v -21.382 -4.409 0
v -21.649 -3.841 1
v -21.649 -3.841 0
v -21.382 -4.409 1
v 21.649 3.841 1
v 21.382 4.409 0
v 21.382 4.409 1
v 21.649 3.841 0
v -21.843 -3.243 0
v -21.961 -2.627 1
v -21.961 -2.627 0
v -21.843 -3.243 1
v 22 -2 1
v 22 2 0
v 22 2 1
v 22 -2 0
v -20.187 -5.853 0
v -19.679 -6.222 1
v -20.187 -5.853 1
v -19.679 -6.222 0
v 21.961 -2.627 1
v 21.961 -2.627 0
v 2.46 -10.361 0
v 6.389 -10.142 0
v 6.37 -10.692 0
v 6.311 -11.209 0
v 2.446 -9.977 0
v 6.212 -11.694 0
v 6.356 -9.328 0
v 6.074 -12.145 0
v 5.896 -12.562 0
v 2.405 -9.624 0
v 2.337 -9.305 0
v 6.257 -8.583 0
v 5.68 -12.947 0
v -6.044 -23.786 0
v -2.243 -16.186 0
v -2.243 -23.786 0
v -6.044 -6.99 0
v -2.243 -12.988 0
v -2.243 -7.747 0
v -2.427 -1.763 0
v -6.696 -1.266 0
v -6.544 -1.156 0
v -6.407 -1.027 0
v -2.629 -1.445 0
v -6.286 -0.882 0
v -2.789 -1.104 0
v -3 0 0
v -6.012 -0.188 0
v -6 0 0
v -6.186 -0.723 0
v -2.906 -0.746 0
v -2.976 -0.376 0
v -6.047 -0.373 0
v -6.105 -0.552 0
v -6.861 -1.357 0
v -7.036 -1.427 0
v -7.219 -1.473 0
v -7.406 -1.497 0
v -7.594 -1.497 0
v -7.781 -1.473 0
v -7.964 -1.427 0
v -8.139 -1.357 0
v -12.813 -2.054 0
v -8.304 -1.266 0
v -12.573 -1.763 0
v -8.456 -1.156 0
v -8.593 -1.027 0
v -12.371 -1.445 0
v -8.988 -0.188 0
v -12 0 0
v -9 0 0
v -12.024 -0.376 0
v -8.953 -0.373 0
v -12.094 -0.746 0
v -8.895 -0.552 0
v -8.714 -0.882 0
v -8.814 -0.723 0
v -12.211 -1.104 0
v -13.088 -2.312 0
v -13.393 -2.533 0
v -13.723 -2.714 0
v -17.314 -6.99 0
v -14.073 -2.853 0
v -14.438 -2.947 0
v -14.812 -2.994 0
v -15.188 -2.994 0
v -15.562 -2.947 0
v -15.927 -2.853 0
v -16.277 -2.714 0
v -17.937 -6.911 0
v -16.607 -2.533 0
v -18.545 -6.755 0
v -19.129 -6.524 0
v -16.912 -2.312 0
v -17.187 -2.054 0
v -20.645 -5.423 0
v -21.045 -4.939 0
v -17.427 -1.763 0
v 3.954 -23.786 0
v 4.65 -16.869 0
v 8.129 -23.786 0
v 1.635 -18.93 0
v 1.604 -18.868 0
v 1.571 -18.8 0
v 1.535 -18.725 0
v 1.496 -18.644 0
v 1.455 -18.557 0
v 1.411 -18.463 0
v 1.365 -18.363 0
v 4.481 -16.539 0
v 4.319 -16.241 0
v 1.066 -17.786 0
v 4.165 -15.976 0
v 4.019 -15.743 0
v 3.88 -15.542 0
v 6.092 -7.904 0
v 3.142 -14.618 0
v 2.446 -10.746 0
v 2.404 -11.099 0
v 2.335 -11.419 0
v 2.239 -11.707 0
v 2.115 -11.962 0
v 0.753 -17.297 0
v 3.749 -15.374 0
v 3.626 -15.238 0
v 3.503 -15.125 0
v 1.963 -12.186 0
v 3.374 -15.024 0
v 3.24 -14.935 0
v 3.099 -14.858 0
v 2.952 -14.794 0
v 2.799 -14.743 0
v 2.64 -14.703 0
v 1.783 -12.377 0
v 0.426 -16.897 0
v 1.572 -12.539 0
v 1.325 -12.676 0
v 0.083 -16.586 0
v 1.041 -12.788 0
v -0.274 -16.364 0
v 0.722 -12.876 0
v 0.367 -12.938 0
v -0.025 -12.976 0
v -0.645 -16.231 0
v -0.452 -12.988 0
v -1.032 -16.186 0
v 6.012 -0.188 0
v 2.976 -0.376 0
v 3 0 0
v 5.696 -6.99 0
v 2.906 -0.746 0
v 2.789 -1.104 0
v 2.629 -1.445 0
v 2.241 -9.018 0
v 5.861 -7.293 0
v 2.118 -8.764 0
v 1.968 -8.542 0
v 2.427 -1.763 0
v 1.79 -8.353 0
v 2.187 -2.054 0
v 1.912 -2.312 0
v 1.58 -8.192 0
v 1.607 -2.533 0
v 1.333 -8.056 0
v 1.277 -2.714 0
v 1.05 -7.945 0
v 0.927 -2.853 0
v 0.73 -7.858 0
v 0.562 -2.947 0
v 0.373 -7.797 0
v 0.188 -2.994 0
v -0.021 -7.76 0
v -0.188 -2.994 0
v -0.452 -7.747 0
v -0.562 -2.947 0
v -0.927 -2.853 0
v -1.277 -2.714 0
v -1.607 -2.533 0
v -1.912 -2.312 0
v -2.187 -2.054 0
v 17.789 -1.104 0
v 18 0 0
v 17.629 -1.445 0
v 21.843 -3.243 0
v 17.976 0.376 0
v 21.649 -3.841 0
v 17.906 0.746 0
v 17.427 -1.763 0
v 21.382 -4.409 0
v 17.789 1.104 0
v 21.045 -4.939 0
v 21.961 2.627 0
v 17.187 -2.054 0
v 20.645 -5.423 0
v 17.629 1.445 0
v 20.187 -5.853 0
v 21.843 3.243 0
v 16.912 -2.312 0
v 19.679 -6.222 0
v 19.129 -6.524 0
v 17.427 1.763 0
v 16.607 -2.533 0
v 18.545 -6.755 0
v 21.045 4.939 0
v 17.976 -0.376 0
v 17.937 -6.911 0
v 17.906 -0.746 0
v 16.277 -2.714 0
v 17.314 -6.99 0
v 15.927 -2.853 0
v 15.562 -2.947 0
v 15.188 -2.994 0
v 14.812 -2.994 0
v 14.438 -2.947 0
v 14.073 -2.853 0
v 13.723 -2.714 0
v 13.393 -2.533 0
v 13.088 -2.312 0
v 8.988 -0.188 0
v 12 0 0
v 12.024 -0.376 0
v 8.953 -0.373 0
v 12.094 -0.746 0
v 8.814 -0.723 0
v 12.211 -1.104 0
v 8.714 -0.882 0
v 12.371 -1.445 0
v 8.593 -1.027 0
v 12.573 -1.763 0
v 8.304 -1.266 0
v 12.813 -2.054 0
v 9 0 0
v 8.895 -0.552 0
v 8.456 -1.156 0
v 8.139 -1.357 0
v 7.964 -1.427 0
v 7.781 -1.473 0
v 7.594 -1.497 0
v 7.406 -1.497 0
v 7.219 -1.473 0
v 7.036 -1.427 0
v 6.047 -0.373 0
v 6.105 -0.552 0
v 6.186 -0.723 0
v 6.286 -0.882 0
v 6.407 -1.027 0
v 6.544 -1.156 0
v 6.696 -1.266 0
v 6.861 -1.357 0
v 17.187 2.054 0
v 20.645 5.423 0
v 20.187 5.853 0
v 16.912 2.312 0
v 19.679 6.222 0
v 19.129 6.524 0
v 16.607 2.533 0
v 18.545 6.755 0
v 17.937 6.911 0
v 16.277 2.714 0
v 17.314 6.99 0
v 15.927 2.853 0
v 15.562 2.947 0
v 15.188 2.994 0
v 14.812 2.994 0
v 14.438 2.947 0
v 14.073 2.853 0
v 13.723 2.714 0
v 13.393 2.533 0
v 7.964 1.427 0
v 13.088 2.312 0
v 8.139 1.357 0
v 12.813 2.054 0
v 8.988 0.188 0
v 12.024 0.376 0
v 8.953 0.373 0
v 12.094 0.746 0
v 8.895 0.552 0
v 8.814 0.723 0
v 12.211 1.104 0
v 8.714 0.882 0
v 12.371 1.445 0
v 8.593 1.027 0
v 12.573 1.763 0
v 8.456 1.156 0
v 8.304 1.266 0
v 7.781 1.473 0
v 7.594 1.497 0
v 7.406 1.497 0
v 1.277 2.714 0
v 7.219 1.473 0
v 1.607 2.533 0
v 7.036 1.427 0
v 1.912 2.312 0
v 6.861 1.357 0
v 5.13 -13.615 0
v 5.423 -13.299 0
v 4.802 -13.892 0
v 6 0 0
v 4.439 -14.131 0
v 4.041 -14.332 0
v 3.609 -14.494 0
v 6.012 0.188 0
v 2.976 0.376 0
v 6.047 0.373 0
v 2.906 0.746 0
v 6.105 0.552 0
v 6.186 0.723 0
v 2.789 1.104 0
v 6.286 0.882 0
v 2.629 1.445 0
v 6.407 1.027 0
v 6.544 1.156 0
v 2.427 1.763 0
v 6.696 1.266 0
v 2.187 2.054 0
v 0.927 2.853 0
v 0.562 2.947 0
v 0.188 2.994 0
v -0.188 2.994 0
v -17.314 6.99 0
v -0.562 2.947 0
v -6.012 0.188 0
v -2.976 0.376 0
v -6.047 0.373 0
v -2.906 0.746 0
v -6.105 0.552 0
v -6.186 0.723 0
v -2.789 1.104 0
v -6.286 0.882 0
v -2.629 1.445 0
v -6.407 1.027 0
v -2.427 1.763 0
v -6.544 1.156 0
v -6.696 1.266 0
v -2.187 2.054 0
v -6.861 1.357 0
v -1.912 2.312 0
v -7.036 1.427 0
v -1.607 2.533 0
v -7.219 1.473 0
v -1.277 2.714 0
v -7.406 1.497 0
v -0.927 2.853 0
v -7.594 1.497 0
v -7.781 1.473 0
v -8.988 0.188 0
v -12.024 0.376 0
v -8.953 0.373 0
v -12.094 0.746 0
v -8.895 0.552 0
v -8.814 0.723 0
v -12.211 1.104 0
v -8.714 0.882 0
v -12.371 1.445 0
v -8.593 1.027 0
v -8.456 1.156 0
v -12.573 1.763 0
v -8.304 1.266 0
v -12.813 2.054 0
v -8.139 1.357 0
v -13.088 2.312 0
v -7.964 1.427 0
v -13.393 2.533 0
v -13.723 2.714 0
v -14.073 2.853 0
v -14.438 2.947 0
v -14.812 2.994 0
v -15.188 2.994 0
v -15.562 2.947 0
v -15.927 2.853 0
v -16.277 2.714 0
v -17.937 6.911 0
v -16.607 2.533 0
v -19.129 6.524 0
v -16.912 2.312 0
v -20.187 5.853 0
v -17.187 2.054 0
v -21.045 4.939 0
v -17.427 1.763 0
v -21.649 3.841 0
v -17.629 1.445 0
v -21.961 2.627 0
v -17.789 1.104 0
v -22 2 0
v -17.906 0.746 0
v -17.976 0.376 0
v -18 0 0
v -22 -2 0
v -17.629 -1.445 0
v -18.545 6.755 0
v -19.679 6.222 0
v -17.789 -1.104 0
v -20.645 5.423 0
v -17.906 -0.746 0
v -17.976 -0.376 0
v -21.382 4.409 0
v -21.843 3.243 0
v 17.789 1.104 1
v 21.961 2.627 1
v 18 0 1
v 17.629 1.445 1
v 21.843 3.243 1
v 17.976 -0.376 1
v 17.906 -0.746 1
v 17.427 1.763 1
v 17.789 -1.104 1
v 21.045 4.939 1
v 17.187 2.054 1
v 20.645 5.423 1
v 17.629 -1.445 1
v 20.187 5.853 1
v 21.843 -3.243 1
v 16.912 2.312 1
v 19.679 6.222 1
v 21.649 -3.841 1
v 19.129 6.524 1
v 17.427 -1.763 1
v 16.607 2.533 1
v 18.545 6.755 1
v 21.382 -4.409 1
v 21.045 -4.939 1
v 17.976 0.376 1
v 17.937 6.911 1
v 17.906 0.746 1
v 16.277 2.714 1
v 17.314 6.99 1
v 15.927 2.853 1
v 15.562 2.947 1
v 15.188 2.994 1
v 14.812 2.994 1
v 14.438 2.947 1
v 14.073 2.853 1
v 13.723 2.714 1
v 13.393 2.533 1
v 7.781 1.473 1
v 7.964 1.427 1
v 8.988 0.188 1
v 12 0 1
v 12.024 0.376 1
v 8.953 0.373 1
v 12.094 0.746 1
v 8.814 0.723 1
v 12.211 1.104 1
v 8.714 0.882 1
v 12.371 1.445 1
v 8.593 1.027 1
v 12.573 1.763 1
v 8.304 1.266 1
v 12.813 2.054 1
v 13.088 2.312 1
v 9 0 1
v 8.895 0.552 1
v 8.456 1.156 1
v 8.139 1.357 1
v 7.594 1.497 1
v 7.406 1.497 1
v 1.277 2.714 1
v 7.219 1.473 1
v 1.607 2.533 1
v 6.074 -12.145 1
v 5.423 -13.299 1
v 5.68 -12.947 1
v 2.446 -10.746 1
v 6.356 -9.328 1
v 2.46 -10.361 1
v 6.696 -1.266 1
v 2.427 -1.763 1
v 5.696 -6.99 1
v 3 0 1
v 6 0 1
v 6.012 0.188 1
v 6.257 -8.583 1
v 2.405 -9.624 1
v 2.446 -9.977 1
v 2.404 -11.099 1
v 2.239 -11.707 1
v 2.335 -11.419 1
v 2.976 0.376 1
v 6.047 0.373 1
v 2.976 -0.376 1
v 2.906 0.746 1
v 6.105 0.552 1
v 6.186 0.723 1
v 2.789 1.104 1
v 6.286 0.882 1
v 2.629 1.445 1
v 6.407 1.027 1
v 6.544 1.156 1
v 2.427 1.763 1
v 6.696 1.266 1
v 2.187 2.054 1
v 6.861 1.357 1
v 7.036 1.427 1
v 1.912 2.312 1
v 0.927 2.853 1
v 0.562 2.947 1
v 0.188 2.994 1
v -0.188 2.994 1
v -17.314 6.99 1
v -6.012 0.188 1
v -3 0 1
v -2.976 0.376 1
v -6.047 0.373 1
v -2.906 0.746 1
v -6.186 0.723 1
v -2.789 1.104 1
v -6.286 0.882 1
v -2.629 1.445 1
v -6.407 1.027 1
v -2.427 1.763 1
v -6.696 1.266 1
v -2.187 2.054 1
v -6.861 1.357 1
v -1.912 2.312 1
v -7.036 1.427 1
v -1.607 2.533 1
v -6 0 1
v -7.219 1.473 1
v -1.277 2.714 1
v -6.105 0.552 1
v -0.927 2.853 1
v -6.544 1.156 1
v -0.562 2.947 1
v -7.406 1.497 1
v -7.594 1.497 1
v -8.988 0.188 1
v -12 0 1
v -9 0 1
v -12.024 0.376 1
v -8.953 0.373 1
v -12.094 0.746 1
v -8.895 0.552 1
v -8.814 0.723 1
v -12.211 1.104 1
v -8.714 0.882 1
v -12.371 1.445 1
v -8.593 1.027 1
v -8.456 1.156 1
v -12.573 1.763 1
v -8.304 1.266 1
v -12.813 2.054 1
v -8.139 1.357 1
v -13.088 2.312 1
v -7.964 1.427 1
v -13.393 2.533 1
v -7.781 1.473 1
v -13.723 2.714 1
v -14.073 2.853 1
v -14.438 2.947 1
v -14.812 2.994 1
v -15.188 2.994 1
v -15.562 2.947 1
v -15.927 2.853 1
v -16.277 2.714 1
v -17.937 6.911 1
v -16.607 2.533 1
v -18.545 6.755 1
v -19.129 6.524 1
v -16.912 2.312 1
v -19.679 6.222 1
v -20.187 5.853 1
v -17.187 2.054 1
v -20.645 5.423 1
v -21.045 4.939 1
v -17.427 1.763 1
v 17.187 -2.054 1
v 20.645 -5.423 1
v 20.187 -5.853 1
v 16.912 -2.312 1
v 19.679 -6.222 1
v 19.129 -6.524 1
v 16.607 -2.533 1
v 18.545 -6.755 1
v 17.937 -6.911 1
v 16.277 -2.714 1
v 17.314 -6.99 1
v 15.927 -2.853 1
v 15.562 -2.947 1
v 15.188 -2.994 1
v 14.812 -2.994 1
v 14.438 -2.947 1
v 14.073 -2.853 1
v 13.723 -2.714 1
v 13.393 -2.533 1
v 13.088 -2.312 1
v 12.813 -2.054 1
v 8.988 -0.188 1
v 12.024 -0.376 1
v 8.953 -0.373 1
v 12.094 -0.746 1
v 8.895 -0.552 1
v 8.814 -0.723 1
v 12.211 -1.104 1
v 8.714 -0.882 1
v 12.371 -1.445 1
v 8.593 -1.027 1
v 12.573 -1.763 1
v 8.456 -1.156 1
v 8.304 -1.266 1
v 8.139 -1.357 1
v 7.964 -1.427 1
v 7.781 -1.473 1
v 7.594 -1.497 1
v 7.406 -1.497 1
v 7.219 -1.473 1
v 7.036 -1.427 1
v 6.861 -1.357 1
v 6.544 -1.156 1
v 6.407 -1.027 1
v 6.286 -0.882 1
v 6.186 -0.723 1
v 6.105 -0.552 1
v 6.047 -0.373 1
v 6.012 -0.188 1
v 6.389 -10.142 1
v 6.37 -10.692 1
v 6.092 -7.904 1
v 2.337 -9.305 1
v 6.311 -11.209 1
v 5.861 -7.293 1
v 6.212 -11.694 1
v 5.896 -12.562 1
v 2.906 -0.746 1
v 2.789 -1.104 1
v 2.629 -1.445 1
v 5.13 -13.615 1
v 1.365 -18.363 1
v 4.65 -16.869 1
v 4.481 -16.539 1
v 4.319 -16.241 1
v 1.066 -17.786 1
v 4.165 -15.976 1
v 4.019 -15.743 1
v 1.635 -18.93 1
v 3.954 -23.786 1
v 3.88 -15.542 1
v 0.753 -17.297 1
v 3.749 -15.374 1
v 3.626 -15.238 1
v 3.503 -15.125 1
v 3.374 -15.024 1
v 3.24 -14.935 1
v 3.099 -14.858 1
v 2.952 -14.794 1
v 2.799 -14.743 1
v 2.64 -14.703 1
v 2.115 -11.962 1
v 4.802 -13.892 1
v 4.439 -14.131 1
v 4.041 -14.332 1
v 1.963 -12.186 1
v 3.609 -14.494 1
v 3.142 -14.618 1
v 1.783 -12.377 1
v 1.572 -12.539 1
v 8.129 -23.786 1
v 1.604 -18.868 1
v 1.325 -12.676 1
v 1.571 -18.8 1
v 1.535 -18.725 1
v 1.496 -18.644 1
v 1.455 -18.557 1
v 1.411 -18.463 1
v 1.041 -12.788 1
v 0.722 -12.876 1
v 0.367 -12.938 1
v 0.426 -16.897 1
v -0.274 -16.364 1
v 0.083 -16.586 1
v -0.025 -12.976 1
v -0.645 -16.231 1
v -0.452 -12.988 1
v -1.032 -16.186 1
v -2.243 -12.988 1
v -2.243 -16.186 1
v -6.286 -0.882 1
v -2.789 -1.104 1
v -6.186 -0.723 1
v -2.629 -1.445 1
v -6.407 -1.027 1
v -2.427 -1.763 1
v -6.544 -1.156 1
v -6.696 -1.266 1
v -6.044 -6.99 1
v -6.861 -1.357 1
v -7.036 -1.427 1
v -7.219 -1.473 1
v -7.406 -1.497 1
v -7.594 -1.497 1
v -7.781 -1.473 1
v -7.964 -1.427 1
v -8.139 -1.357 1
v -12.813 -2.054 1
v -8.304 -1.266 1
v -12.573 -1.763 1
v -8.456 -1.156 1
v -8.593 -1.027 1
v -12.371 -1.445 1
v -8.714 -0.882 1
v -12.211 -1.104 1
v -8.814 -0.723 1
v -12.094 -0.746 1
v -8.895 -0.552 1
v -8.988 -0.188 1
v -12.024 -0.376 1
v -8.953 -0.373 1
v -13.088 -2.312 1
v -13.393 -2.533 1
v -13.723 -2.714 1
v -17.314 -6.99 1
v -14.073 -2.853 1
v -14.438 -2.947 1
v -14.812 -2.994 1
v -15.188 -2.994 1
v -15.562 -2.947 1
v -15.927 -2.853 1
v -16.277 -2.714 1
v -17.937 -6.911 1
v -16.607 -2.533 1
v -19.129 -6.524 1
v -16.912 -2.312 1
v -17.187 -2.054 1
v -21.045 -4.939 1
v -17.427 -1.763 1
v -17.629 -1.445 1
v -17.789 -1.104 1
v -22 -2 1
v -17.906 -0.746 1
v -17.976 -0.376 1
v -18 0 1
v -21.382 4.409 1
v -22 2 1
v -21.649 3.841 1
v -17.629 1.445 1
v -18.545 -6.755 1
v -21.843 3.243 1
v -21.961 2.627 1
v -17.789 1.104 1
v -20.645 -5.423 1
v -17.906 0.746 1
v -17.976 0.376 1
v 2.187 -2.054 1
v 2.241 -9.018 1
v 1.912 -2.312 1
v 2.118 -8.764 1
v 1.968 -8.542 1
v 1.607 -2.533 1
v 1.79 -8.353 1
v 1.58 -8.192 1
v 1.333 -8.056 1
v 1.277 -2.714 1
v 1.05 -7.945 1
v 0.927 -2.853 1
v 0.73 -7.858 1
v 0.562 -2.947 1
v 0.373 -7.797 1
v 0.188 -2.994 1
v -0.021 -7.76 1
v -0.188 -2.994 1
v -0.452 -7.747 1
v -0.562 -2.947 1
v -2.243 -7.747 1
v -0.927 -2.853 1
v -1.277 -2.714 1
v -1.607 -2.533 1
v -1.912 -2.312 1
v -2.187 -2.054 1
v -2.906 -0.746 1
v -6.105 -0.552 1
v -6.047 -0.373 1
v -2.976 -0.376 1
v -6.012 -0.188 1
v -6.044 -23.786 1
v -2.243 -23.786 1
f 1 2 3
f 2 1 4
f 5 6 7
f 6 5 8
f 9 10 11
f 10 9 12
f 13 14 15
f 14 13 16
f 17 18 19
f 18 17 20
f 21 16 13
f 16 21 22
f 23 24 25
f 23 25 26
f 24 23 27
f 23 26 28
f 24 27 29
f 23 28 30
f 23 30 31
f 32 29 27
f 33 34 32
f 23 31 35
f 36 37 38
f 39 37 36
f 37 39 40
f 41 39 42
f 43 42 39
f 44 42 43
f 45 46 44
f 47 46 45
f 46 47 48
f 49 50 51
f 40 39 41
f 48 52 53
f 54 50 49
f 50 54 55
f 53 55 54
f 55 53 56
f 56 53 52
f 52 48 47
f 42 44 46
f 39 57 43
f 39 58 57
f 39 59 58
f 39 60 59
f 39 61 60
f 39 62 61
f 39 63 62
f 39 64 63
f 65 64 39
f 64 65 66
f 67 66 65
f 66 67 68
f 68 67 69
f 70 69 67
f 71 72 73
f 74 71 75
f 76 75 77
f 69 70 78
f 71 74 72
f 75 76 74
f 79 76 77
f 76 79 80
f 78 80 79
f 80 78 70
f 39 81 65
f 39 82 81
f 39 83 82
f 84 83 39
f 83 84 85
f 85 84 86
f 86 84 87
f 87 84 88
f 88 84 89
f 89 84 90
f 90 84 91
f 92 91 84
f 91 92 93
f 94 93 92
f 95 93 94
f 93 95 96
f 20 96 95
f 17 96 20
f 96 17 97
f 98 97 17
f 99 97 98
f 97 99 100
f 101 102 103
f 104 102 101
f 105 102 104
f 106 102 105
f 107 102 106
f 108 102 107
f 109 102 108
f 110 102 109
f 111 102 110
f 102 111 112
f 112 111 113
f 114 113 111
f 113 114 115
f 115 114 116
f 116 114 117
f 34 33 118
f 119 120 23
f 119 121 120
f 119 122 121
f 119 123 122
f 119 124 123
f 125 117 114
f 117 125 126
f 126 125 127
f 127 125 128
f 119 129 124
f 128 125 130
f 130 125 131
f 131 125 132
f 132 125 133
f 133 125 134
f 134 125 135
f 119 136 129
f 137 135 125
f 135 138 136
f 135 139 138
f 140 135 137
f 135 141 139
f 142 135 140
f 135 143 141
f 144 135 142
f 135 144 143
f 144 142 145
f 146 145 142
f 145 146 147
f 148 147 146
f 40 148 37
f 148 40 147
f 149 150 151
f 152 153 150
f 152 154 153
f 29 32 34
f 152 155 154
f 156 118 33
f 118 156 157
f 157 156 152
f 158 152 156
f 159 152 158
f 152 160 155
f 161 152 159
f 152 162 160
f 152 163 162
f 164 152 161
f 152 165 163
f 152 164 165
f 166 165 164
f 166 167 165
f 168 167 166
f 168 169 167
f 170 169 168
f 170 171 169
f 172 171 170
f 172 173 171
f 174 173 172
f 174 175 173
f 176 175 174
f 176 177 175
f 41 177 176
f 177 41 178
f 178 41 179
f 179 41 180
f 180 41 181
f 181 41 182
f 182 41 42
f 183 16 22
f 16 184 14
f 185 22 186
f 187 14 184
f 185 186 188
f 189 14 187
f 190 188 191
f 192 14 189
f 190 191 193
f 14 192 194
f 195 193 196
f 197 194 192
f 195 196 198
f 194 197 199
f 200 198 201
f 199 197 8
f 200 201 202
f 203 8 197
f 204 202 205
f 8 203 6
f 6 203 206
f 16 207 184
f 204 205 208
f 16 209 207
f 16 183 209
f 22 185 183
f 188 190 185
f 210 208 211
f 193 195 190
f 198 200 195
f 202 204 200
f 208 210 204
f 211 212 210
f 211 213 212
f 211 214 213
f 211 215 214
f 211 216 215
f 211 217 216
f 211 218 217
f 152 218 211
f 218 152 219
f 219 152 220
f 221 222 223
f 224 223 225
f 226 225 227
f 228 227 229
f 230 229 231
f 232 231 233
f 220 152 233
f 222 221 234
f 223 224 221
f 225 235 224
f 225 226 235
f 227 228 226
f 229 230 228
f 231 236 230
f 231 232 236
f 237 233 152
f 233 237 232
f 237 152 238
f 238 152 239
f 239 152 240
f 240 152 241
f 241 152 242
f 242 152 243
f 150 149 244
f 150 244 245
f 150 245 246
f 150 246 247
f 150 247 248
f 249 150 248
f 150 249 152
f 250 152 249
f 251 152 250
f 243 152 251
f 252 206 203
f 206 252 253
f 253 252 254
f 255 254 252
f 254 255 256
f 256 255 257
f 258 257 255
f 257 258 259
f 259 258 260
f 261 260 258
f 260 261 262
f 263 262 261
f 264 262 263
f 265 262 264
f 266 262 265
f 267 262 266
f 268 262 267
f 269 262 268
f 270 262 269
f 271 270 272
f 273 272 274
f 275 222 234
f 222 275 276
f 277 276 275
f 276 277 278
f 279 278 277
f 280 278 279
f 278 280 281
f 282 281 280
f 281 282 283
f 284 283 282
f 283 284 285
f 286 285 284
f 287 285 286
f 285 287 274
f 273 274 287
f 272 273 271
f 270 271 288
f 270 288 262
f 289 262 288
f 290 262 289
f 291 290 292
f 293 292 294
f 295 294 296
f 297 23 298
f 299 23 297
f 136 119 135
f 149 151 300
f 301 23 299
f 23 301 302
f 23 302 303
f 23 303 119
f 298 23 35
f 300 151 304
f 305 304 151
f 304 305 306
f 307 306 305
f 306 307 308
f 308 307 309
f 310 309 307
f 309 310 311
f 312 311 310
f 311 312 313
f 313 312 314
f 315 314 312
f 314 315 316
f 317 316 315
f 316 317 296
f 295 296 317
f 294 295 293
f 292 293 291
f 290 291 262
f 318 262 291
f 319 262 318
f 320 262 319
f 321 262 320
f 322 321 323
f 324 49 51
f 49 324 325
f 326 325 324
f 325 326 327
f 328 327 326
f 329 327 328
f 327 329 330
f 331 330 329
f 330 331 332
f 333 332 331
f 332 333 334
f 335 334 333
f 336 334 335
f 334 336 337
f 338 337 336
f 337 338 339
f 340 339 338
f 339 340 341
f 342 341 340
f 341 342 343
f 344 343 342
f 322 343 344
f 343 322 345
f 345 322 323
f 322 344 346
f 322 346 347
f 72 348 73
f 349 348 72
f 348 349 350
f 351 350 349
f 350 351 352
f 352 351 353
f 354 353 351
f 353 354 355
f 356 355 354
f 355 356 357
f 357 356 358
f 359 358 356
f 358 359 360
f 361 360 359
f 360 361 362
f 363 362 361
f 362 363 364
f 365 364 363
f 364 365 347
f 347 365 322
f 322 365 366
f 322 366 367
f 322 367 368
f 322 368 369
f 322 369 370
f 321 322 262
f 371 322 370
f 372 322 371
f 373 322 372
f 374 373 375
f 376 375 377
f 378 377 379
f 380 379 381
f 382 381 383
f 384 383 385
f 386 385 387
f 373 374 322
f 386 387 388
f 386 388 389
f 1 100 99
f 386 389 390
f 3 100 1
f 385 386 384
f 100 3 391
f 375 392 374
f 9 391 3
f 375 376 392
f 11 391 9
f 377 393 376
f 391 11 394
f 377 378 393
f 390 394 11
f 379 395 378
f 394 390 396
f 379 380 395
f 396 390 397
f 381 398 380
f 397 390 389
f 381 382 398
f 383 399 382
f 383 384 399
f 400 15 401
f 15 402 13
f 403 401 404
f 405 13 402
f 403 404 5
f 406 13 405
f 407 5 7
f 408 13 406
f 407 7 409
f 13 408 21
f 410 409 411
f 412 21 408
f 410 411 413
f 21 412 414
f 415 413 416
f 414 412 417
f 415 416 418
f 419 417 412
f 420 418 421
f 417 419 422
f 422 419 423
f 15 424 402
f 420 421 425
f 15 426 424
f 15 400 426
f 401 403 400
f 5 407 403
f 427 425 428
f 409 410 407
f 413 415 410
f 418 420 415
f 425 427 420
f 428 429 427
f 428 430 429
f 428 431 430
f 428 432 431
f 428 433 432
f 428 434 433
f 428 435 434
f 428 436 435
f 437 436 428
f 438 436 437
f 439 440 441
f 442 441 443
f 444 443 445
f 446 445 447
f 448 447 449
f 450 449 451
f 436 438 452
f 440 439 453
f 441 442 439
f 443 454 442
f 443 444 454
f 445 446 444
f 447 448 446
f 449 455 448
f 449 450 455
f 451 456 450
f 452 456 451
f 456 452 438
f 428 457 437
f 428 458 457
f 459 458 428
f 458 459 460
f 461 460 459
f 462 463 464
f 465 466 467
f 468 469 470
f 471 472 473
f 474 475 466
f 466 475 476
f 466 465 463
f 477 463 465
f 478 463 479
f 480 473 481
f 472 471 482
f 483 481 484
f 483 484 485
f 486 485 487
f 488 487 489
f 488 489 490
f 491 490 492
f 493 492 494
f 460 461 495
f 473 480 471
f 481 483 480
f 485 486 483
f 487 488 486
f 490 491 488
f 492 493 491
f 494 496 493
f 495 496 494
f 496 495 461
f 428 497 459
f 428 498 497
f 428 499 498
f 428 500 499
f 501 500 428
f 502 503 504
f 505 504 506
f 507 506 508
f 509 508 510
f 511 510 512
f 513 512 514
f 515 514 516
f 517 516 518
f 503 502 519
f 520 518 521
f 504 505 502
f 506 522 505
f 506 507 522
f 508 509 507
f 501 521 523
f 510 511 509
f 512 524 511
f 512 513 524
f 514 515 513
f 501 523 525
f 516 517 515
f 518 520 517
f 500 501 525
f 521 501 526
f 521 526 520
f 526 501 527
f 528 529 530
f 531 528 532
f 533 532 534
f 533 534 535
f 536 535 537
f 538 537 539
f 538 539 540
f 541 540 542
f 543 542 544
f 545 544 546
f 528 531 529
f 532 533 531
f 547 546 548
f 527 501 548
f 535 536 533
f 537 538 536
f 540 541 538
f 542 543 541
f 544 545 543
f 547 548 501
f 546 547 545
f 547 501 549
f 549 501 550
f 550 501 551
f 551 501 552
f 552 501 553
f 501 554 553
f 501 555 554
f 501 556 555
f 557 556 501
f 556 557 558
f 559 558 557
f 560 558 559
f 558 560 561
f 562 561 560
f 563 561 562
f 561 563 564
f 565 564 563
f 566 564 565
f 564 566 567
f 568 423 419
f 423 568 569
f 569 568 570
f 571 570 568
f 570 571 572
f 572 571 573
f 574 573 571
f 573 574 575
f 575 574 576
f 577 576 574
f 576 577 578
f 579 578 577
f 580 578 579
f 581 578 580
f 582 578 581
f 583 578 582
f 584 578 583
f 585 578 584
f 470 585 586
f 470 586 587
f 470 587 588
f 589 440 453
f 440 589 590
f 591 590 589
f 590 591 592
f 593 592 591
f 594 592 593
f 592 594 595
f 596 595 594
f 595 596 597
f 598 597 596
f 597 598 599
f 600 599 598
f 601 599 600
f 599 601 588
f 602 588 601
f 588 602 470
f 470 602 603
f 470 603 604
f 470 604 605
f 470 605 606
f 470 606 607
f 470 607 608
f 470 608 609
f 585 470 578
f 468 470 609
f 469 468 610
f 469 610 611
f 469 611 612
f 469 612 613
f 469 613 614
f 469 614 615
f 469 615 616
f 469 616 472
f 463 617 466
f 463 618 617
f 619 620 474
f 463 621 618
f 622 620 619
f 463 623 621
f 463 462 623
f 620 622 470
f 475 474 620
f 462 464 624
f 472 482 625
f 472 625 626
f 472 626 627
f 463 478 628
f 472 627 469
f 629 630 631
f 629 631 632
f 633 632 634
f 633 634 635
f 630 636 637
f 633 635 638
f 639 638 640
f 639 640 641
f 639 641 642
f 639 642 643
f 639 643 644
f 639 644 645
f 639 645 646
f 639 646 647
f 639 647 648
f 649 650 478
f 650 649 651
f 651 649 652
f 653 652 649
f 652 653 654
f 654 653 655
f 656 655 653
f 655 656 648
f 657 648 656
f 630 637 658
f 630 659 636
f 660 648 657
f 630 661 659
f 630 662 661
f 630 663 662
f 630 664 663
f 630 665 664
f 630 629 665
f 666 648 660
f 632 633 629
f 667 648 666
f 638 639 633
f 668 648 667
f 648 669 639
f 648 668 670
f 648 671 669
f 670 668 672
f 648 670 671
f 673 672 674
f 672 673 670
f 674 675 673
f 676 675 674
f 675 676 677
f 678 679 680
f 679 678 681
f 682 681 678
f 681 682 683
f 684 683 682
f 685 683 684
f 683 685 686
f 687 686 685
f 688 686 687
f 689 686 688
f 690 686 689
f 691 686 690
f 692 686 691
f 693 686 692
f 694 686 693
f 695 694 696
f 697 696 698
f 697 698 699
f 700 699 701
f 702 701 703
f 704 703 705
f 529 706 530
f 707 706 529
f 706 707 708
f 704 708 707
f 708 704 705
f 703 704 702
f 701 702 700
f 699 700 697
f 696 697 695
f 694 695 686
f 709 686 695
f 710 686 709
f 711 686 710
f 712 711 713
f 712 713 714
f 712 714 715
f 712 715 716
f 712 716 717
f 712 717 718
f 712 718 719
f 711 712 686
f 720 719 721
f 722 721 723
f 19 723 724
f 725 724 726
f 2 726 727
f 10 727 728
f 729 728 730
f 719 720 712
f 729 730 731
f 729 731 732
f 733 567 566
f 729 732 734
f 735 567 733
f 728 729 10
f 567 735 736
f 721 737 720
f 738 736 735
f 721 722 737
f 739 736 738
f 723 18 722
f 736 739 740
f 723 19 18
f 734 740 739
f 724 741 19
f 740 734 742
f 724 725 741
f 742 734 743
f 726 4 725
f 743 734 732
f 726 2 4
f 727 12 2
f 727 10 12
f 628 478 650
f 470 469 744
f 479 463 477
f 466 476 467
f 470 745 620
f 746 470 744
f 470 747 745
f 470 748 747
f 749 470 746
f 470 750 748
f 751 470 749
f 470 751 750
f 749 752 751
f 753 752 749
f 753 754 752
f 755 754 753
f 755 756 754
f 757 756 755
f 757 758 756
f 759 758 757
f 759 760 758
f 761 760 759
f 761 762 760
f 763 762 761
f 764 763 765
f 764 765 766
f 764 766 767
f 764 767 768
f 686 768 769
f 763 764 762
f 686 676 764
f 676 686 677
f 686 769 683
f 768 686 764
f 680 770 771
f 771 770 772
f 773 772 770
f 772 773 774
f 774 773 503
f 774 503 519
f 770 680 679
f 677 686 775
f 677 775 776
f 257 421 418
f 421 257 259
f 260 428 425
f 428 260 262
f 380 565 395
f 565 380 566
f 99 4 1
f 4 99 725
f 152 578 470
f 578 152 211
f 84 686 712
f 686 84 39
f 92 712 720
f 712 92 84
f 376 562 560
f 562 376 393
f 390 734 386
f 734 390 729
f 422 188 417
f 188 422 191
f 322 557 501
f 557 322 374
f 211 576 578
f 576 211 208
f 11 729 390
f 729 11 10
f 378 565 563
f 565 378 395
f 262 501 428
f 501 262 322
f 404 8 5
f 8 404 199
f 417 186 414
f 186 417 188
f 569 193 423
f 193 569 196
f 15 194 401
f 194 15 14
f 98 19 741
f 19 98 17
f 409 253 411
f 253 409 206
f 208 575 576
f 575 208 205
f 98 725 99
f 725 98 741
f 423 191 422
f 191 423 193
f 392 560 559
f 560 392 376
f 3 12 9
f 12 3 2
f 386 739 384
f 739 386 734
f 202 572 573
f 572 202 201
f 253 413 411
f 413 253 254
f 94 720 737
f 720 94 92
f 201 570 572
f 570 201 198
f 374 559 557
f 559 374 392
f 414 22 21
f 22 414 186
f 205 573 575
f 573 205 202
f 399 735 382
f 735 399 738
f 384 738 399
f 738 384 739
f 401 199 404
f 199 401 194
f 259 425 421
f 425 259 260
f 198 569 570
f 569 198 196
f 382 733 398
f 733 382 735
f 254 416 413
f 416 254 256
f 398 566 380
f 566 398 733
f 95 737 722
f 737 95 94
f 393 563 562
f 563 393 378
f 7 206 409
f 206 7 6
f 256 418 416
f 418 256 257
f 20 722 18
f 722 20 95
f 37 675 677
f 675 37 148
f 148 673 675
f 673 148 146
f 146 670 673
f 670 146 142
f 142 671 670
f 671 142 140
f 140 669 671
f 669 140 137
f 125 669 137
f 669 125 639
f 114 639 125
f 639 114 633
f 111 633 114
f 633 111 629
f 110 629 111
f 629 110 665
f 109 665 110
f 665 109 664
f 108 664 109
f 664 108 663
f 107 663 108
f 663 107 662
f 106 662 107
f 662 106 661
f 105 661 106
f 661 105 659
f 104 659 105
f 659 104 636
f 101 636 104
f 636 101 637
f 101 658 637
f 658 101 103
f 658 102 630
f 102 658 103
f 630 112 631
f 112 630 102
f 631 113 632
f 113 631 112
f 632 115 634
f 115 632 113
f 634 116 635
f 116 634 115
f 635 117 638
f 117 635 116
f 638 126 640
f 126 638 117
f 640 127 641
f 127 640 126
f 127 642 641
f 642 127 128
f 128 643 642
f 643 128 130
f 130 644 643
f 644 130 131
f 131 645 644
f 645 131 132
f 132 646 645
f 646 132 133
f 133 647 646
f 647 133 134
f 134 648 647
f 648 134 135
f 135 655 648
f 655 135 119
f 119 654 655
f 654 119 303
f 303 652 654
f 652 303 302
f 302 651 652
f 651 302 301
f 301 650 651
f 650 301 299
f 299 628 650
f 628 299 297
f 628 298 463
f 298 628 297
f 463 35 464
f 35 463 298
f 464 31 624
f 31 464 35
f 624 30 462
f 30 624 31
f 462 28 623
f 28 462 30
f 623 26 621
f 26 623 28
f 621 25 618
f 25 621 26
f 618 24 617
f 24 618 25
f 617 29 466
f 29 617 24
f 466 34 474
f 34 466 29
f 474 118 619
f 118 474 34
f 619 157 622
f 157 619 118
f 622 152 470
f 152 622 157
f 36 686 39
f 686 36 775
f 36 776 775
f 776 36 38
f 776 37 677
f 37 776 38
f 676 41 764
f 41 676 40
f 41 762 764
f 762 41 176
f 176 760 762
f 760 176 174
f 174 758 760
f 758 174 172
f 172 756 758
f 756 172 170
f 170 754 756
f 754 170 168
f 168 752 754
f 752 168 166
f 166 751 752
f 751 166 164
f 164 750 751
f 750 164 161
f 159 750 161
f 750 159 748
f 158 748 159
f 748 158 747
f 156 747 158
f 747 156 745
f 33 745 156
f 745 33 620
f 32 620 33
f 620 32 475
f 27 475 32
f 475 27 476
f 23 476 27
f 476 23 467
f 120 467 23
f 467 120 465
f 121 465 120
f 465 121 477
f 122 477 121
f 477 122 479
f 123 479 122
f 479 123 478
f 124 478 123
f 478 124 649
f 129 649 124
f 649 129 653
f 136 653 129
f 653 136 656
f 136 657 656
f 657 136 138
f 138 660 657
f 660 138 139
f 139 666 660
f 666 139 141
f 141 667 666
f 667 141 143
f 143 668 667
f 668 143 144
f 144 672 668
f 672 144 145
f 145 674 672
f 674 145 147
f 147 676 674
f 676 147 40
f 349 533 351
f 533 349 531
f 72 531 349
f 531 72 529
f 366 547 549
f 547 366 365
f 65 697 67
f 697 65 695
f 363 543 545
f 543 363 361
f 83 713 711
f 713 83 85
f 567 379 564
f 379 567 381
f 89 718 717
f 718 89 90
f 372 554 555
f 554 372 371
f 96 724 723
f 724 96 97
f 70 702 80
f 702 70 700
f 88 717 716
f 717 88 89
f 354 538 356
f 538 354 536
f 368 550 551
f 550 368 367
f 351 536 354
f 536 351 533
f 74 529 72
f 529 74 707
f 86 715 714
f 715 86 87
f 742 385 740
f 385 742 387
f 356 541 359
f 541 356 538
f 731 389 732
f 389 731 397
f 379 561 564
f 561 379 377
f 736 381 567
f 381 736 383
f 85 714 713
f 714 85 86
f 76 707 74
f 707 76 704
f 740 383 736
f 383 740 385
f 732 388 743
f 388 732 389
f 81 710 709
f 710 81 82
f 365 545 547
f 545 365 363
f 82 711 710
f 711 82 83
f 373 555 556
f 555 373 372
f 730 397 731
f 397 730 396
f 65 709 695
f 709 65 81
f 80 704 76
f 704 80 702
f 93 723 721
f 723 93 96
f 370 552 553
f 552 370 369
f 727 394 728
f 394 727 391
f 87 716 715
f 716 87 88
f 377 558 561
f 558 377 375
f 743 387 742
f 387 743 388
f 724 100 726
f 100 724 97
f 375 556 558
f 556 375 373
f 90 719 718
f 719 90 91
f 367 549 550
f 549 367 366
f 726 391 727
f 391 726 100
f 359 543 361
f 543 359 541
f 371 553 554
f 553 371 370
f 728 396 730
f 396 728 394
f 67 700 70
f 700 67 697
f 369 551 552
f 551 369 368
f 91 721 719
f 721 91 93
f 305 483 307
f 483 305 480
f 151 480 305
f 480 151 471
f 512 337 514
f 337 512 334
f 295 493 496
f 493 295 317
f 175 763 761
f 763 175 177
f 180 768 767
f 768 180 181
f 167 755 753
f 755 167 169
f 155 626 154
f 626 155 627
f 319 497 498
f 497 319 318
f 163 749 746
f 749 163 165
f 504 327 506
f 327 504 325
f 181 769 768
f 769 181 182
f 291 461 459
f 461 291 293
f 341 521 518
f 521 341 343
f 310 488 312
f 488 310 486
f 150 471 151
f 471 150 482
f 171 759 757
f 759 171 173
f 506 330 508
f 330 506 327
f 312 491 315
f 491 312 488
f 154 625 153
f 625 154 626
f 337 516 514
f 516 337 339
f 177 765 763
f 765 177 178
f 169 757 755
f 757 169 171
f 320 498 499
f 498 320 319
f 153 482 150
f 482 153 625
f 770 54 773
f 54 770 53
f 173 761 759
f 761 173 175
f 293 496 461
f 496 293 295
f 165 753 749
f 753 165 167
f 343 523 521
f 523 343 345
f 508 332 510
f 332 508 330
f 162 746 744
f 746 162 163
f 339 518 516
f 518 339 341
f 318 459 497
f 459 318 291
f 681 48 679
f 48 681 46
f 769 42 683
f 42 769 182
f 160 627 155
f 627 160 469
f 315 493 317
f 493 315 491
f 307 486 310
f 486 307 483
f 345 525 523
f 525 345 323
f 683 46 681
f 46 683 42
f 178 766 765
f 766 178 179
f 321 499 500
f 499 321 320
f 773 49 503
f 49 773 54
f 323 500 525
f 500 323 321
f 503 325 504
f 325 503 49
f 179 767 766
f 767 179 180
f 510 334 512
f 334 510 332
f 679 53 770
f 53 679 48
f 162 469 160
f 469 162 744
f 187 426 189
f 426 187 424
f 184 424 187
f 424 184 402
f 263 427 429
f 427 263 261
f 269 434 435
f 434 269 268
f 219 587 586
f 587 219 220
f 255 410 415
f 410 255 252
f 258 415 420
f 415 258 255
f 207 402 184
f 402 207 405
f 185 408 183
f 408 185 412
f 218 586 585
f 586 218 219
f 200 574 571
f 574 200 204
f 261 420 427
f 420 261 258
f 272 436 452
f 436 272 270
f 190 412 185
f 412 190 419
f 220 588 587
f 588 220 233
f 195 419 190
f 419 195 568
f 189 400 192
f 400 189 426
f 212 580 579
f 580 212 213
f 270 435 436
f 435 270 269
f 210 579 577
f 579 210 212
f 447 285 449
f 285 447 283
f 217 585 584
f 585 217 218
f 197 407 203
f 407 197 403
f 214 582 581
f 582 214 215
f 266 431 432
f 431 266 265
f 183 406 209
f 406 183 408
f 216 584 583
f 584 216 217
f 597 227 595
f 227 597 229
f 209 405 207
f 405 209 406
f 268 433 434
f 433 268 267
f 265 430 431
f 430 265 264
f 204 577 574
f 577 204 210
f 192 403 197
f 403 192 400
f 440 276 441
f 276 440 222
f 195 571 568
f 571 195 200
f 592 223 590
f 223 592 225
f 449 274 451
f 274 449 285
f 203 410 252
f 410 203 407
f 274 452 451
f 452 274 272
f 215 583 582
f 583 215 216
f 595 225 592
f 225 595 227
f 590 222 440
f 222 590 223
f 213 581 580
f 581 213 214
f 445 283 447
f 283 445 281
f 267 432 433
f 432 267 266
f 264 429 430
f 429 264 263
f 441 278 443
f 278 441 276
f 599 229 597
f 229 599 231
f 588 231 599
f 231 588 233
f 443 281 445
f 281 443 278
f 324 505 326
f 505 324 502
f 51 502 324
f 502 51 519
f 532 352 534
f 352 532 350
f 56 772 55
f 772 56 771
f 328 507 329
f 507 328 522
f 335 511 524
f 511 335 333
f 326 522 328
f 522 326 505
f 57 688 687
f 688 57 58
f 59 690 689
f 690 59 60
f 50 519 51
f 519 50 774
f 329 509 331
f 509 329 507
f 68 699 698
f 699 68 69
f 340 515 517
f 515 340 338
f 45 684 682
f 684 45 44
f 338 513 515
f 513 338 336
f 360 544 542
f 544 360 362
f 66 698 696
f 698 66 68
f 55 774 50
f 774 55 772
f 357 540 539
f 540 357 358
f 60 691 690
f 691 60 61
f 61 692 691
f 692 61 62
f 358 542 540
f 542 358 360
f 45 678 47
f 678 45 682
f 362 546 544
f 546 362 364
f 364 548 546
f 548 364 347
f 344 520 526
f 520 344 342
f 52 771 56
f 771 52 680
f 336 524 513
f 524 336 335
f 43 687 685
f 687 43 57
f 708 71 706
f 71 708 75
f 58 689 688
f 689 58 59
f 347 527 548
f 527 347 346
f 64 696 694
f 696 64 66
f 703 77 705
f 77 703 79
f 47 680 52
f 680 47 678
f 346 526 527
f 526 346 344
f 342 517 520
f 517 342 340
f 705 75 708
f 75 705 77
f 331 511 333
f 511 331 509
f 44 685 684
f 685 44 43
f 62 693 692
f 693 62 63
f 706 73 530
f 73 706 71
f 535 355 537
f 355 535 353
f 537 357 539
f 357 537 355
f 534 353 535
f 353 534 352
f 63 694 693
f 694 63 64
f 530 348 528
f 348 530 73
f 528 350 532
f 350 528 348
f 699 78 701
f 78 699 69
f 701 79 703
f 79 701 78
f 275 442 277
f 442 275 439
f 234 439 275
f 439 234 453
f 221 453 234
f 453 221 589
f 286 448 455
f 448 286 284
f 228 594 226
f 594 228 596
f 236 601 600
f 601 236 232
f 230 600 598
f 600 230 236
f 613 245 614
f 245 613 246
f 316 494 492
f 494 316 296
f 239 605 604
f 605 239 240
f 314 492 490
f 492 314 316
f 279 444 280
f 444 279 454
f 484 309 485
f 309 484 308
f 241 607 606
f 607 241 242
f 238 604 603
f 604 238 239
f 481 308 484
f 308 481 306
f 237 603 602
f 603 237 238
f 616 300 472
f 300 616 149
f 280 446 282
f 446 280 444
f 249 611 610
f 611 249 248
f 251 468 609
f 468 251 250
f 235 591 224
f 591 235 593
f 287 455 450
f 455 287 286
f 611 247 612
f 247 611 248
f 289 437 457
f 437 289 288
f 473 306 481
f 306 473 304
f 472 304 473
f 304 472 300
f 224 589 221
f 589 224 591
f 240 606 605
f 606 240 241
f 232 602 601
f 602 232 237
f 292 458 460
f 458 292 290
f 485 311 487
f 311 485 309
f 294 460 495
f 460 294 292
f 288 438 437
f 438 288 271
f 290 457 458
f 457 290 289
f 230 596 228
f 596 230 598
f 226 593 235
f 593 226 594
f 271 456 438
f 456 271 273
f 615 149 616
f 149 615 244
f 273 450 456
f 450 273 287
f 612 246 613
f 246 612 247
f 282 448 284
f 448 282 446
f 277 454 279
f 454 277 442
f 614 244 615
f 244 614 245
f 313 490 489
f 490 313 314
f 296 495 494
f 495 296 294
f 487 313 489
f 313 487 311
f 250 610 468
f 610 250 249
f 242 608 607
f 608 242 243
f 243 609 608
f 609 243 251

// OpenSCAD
$fn = 50;


difference() {
	union() {
		*color(alpha = 1.0000000000, c = "gray") {
			translate(v = [0, 14, 0]) {
				linear_extrude(height = 1) {
					text(font = "Arial:style=Bold", halign = "center", size = 4.5000000000, text = "COMMENT description oobb_plate_shape_p_type_1_depth_3_width_1_thickness_r_extra_oobb_size", valign = "center");
				}
			}
		}
		hull() {
			translate(v = [-17.0000000000, 2.0000000000, 0]) {
				cylinder(h = 1, r = 5);
			}
			translate(v = [17.0000000000, 2.0000000000, 0]) {
				cylinder(h = 1, r = 5);
			}
			translate(v = [-17.0000000000, -2.0000000000, 0]) {
				cylinder(h = 1, r = 5);
			}
			translate(v = [17.0000000000, -2.0000000000, 0]) {
				cylinder(h = 1, r = 5);
			}
		}
		translate(v = [0, -5, 0]) {
			linear_extrude(height = 1) {
				text(font = "DejaVu Sans Mono:style=Bold", halign = "center", size = 19.0000000000, text = "R", valign = "top");
			}
		}
	}
	union() {
		*color(alpha = 1.0000000000, c = "gray") {
			translate(v = [0, 14, 0]) {
				linear_extrude(height = 1) {
					text(font = "Arial:style=Bold", halign = "center", size = 4.5000000000, text = "COMMENT description oobb_holes_shape_n_type_3_width_1_thickness_r_extra_oobb_size_1_height_'all'_holes_true_both_holes", valign = "center");
				}
			}
		}
		translate(v = [-15.0000000000, 0.0000000000, 0]) {
			translate(v = [0, 0, -50]) {
				cylinder(h = 100, r = 3.0000000000);
			}
		}
		translate(v = [0, 0, -50]) {
			cylinder(h = 100, r = 3.0000000000);
		}
		translate(v = [15.0000000000, 0.0000000000, 0]) {
			translate(v = [0, 0, -50]) {
				cylinder(h = 100, r = 3.0000000000);
			}
		}
		translate(v = [-15.0000000000, 0.0000000000, 0]) {
			translate(v = [0, 0, -50]) {
				cylinder(h = 100, r = 1.5000000000);
			}
		}
		translate(v = [-7.5000000000, 0.0000000000, 0]) {
			translate(v = [0, 0, -50]) {
				cylinder(h = 100, r = 1.5000000000);
			}
		}
		translate(v = [0, 0, -50]) {
			cylinder(h = 100, r = 1.5000000000);
		}
		translate(v = [7.5000000000, 0.0000000000, 0]) {
			translate(v = [0, 0, -50]) {
				cylinder(h = 100, r = 1.5000000000);
			}
		}
		translate(v = [15.0000000000, 0.0000000000, 0]) {
			translate(v = [0, 0, -50]) {
				cylinder(h = 100, r = 1.5000000000);
			}
		}
	}
}
